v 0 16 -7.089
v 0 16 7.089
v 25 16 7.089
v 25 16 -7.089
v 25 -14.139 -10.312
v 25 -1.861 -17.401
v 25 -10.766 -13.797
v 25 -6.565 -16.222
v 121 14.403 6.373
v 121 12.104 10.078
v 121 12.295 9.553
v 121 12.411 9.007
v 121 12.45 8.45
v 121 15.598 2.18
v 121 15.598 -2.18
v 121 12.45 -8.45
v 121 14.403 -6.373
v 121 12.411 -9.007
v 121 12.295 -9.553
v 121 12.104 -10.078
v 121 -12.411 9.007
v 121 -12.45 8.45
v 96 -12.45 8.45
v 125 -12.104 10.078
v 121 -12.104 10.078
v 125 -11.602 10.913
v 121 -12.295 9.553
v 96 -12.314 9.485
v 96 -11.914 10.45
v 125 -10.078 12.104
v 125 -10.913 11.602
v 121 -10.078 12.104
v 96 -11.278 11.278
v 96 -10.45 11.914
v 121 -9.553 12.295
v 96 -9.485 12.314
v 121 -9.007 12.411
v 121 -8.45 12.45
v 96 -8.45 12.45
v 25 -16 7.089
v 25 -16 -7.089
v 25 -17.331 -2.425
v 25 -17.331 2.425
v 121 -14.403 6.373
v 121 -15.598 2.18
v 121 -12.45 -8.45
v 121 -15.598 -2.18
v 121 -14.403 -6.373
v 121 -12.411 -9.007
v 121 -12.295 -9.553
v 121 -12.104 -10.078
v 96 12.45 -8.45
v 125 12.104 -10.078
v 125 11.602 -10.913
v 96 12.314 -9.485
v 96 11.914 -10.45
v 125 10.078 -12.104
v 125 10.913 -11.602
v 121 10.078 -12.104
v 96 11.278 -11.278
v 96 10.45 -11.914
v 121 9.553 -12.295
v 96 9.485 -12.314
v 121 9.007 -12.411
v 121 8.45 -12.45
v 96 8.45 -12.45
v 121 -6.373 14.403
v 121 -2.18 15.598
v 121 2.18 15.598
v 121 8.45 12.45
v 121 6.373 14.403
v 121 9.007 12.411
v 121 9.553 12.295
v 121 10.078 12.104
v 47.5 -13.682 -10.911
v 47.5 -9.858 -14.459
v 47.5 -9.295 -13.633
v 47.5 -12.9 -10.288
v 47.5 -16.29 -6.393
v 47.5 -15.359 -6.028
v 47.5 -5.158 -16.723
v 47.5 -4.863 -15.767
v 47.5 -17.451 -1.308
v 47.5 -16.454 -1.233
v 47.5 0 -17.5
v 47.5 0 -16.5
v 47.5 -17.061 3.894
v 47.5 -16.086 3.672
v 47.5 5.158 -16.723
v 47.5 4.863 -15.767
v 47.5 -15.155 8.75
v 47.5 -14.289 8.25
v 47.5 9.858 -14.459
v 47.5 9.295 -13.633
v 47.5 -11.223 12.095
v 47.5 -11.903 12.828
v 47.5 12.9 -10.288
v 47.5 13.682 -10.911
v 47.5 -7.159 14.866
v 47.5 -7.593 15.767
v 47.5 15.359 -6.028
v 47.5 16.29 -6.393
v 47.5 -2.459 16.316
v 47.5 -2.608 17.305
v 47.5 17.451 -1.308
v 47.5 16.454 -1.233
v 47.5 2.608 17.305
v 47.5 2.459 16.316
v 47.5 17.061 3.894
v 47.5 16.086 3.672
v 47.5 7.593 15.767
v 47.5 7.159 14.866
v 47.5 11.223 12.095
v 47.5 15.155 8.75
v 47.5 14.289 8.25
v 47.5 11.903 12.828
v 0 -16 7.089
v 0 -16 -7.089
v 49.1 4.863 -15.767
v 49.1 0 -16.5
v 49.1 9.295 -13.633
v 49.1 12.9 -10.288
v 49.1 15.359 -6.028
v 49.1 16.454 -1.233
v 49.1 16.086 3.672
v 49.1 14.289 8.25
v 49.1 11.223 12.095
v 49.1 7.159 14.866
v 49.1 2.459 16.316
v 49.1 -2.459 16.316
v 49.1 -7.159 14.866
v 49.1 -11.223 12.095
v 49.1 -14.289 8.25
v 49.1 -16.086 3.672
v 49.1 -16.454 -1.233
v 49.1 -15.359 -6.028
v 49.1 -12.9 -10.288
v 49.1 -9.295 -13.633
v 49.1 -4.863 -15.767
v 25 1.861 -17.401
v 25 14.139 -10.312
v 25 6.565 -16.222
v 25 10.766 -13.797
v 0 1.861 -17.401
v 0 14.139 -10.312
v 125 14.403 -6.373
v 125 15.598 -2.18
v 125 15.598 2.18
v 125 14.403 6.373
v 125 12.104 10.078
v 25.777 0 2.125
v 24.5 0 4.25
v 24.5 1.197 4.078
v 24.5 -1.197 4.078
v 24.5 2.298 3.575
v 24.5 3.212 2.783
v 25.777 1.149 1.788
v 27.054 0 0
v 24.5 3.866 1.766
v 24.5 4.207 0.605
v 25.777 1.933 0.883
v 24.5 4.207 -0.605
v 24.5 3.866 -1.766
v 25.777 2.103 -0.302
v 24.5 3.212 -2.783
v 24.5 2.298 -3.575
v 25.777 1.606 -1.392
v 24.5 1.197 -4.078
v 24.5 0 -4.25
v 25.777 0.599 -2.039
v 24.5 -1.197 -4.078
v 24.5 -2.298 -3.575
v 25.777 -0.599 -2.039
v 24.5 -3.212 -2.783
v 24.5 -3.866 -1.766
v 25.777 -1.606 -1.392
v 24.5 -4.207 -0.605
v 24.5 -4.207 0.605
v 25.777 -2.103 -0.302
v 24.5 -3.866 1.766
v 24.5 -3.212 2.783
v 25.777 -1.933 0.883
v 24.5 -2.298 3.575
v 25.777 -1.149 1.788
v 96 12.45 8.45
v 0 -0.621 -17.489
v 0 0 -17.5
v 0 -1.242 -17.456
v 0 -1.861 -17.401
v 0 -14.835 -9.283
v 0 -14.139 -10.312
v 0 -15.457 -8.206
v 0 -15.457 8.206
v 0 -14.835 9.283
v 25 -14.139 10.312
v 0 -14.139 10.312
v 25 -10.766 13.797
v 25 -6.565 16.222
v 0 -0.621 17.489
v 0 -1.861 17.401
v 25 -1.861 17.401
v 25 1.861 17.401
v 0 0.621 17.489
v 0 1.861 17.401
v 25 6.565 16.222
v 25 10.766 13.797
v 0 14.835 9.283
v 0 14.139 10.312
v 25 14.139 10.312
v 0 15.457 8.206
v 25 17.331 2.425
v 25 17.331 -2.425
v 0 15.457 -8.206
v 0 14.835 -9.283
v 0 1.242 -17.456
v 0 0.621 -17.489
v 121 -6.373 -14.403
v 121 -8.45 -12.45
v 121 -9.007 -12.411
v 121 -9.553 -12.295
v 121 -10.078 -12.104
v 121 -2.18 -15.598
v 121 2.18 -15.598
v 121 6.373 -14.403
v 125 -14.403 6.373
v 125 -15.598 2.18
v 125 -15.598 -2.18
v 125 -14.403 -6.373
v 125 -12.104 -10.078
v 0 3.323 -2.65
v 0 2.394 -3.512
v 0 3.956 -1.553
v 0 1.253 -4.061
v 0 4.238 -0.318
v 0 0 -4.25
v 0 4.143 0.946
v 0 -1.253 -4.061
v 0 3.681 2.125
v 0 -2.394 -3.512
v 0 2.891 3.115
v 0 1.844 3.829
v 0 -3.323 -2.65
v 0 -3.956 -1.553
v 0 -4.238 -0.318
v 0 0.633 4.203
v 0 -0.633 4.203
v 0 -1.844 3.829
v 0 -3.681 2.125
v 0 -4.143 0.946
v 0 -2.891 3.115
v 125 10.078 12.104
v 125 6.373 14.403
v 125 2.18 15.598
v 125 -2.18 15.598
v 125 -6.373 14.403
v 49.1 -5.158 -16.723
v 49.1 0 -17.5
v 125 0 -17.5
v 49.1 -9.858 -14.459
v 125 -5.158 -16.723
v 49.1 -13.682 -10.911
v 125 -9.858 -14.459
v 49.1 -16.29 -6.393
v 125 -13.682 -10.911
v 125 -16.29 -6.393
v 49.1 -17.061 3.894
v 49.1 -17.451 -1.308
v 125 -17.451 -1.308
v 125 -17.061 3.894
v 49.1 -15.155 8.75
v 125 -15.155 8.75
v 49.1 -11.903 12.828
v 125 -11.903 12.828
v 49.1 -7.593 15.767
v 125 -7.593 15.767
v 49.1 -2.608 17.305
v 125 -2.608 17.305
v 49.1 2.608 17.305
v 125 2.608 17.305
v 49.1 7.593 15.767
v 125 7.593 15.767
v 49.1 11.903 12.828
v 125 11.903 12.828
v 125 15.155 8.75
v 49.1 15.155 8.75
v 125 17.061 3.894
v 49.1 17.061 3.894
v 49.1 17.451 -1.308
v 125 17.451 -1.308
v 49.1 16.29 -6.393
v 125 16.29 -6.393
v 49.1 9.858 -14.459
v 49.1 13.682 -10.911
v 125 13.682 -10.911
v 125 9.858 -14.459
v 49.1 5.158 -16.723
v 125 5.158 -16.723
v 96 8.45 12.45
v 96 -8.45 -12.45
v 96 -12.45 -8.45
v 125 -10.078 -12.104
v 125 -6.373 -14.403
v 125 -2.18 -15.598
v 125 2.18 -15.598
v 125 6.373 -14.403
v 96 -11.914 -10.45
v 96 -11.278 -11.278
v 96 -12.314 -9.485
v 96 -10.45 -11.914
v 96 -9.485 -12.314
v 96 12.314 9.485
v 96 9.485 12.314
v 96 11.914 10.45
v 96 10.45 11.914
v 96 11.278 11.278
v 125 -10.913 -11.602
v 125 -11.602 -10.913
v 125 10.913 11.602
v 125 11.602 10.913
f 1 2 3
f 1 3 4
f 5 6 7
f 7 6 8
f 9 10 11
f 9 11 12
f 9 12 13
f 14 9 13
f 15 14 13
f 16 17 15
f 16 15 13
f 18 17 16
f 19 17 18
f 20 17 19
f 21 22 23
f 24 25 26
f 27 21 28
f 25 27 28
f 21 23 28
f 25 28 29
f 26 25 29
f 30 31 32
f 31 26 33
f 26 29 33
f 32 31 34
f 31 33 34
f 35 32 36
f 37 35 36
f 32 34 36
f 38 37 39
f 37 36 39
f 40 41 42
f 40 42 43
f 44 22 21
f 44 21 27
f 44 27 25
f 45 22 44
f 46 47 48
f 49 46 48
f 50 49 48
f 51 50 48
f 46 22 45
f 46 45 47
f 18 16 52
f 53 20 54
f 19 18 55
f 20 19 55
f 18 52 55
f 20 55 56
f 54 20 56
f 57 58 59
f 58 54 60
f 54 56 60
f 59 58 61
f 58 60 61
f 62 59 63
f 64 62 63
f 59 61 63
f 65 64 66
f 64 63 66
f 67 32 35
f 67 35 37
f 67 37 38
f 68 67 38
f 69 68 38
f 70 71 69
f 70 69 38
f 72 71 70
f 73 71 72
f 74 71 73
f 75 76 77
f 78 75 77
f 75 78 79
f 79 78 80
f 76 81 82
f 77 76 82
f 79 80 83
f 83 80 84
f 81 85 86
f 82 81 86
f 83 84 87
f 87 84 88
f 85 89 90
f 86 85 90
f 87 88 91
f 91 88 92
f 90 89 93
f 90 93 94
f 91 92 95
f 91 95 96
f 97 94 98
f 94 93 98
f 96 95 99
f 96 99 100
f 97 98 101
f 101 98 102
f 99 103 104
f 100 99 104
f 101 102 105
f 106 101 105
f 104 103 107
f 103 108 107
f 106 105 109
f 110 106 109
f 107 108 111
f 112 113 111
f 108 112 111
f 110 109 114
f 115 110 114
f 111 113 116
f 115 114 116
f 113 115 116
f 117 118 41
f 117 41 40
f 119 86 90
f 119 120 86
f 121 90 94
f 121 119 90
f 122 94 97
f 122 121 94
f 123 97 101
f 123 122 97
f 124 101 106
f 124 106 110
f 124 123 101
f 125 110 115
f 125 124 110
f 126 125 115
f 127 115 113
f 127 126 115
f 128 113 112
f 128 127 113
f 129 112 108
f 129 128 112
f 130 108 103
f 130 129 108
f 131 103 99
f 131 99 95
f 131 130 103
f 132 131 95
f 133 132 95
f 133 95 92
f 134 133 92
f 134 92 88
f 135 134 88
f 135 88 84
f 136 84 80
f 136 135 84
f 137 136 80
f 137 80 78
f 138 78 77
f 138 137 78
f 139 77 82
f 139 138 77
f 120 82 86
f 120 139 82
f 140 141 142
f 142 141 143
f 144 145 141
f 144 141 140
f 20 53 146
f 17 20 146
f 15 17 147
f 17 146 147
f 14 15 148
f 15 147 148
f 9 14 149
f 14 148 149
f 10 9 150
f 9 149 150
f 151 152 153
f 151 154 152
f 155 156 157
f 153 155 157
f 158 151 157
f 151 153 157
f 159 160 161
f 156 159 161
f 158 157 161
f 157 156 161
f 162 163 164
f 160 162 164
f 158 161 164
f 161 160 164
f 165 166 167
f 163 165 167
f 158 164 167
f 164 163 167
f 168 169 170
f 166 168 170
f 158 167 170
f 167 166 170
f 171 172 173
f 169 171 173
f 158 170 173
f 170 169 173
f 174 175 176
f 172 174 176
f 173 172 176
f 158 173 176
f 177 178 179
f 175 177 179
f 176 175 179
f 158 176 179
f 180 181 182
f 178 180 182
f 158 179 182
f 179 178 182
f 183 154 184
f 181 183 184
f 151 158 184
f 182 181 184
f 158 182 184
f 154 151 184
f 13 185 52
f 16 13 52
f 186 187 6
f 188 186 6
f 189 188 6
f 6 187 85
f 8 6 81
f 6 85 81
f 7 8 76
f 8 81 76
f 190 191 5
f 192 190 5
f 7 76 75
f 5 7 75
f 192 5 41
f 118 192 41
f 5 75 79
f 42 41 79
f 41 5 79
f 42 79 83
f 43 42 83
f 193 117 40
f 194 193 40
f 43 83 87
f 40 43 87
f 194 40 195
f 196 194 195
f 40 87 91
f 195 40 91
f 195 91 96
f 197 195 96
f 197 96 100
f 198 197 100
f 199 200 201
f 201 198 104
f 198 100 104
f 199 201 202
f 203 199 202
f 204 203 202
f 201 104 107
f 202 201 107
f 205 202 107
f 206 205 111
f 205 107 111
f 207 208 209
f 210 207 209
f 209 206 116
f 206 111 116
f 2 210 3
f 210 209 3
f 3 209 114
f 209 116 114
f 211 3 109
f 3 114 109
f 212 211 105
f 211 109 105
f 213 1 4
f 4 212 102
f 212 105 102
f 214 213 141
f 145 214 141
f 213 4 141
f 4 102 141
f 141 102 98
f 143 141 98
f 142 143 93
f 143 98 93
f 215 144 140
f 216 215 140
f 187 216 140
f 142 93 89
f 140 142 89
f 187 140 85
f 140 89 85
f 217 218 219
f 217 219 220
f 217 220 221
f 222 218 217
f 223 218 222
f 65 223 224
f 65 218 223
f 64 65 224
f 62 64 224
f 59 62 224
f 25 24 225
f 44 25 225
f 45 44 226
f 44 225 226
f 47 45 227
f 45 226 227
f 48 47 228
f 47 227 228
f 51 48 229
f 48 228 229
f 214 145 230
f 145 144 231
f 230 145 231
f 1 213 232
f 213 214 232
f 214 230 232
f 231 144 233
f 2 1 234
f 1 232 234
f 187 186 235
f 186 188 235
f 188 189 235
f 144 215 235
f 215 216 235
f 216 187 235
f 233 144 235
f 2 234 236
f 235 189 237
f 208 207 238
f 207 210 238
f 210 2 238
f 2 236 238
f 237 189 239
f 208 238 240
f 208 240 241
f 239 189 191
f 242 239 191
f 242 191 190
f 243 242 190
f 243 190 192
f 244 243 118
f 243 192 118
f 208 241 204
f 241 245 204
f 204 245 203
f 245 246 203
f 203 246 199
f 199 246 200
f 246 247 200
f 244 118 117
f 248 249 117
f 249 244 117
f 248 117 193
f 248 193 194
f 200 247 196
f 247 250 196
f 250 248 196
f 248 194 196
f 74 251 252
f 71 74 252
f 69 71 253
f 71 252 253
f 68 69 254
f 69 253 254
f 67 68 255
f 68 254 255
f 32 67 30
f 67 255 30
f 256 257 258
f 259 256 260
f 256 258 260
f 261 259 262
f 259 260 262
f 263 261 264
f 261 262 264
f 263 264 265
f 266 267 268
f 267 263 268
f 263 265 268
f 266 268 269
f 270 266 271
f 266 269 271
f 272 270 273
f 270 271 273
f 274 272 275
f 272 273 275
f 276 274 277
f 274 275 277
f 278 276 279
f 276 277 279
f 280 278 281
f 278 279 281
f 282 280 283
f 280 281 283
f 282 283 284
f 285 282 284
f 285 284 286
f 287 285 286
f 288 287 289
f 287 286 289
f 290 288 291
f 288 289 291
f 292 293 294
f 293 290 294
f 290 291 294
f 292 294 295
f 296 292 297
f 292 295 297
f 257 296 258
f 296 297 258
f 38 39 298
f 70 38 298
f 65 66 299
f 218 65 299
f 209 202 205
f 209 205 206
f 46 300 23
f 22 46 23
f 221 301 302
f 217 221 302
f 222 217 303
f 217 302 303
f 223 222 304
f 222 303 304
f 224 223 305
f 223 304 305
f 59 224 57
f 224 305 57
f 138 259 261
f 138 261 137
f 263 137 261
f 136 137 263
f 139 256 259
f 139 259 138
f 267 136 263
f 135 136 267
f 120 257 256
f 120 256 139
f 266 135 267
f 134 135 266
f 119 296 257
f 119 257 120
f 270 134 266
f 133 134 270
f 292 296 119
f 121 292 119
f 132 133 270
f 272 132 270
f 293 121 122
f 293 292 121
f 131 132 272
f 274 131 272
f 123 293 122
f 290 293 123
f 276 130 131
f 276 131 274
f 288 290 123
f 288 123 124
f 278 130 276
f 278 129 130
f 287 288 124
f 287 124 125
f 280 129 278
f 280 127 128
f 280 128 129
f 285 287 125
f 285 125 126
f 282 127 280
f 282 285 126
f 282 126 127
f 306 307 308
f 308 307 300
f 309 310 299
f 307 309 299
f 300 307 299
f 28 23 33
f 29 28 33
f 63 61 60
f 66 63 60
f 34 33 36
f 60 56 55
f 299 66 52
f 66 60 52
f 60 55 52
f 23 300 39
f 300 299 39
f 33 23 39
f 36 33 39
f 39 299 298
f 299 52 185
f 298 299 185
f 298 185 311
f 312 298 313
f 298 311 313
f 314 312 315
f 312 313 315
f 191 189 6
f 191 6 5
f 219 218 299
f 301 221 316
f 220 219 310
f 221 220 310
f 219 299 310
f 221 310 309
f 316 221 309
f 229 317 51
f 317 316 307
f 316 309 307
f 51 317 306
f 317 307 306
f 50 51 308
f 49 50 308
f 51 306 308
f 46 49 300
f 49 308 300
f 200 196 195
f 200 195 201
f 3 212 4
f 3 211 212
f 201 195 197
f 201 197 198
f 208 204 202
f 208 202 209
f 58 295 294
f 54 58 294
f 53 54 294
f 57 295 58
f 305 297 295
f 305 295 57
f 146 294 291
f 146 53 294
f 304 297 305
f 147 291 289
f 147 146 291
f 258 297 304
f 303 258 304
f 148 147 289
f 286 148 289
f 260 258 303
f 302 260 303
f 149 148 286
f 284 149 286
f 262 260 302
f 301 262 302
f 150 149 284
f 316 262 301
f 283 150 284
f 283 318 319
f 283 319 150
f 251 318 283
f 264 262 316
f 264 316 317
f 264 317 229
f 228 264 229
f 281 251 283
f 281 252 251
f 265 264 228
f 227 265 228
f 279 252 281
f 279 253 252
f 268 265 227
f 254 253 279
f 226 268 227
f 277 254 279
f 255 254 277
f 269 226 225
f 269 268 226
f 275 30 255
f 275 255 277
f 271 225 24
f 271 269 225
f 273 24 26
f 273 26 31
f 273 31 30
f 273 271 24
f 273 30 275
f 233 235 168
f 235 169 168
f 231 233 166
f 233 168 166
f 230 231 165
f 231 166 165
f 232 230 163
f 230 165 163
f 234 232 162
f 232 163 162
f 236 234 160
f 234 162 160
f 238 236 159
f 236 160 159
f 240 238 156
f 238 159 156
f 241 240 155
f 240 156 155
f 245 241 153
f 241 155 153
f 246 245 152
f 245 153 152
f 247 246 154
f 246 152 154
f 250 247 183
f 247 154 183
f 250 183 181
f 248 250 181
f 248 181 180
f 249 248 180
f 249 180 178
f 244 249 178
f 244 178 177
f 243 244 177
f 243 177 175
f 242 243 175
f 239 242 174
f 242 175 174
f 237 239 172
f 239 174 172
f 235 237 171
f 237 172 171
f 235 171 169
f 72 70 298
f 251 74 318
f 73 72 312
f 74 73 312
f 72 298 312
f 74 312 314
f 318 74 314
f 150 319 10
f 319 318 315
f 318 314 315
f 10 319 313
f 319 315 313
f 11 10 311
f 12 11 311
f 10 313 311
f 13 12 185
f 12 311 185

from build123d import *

# Parameters (mm, degrees)
SKETCH1_W                  = 125
SKETCH1_H                  = 17.5
SKETCH3_R                  = 15.75
CUT_EXTRUDE1_DEPTH         = 4
CUT_EXTRUDE2_DEPTH         = 25
CUT_EXTRUDE2_DEPTH_BACK    = 25
SKETCH5_OUTSIDE_W          = 63.888
SKETCH5_OUTSIDE_H          = 63.888
CUT_EXTRUDE3_DEPTH         = 25
SKETCH6_W                  = 1.6
SKETCH6_H                  = 12.966966859
M10X1_5_TAPPED_HOLE1_D     = 8.5
M10X1_5_TAPPED_HOLE1_DEPTH = 24.5
M10X1_5_TAPPED_HOLE1_TIP   = 2.553657631


with BuildPart() as part:
    # Sketch1 → Revolve1 (revolve)
    with BuildSketch(Plane.XY, mode=Mode.PRIVATE) as revolve1_sk:
        with Locations((62.5, 8.75)):
            Rectangle(SKETCH1_W, SKETCH1_H)
    revolve(revolve1_sk.sketch.rotate(Axis((0, 0, 0), (-1, 0, 0)), 90), axis=Axis((0, 0, 0), (-1, 0, 0)))

    # Sketch3 → Cut-Extrude1 (cut)
    with BuildSketch(Plane(origin=(125, 0, 0), x_dir=(0, 0, -1), z_dir=(1, 0, 0))):
        Circle(SKETCH3_R)
    extrude(amount=-CUT_EXTRUDE1_DEPTH, mode=Mode.SUBTRACT)

    # Sketch4 → Cut-Extrude2 (cut, two sides: drawn at the far end of the back side and taken through both)
    with BuildSketch(Plane(origin=(121, 0, 0), x_dir=(0, 0, -1), z_dir=(1, 0, 0)).offset(-CUT_EXTRUDE2_DEPTH_BACK)):
        with BuildLine():
            Line((-8.45, 12.45), (8.45, 12.45))
            ThreePointArc((8.45, 12.45), (11.278427125, 11.278427125), (12.45, 8.45))
            Line((12.45, 8.45), (12.45, -8.45))
            ThreePointArc((12.45, -8.45), (11.278427125, -11.278427125), (8.45, -12.45))
            Line((8.45, -12.45), (-8.45, -12.45))
            ThreePointArc((-8.45, -12.45), (-11.278427125, -11.278427125), (-12.45, -8.45))
            Line((-12.45, -8.45), (-12.45, 8.45))
            ThreePointArc((-12.45, 8.45), (-11.278427125, 11.278427125), (-8.45, 12.45))
        make_face()
    extrude(amount=CUT_EXTRUDE2_DEPTH + CUT_EXTRUDE2_DEPTH_BACK, mode=Mode.SUBTRACT)

    # Sketch5 outside → Cut-Extrude3 (cut)
    with BuildSketch(Plane.ZY):
        Rectangle(SKETCH5_OUTSIDE_W, SKETCH5_OUTSIDE_H)
        Polygon((9.237604307, 16), (-9.237604307, 16), (-18.475208614, 0), (-9.237604307, -16), (9.237604307, -16), (18.475208614, 0), align=None, mode=Mode.SUBTRACT)
    extrude(amount=-CUT_EXTRUDE3_DEPTH, mode=Mode.SUBTRACT)

    # Sketch6 → Cut-Revolve1 (revolve, cut)
    with BuildSketch(Plane(origin=(0, 0, 0), x_dir=(1, 0, 0), z_dir=(0, 1, 0))):
        with Locations((48.3, 22.98348343)):
            Rectangle(SKETCH6_W, SKETCH6_H)
    revolve(axis=Axis((0, 0, 0), (1, 0, 0)), mode=Mode.SUBTRACT)

    # M10x1.5 Tapped Hole1
    with Locations(Plane.ZY):
        with Locations((0, 0)):
            Hole(M10X1_5_TAPPED_HOLE1_D / 2, depth=M10X1_5_TAPPED_HOLE1_DEPTH)
            with Locations((0, 0, -(M10X1_5_TAPPED_HOLE1_DEPTH + M10X1_5_TAPPED_HOLE1_TIP / 2))):  # 118° drill point
                Cone(0, M10X1_5_TAPPED_HOLE1_D / 2, M10X1_5_TAPPED_HOLE1_TIP, mode=Mode.SUBTRACT)


solid = part.part
